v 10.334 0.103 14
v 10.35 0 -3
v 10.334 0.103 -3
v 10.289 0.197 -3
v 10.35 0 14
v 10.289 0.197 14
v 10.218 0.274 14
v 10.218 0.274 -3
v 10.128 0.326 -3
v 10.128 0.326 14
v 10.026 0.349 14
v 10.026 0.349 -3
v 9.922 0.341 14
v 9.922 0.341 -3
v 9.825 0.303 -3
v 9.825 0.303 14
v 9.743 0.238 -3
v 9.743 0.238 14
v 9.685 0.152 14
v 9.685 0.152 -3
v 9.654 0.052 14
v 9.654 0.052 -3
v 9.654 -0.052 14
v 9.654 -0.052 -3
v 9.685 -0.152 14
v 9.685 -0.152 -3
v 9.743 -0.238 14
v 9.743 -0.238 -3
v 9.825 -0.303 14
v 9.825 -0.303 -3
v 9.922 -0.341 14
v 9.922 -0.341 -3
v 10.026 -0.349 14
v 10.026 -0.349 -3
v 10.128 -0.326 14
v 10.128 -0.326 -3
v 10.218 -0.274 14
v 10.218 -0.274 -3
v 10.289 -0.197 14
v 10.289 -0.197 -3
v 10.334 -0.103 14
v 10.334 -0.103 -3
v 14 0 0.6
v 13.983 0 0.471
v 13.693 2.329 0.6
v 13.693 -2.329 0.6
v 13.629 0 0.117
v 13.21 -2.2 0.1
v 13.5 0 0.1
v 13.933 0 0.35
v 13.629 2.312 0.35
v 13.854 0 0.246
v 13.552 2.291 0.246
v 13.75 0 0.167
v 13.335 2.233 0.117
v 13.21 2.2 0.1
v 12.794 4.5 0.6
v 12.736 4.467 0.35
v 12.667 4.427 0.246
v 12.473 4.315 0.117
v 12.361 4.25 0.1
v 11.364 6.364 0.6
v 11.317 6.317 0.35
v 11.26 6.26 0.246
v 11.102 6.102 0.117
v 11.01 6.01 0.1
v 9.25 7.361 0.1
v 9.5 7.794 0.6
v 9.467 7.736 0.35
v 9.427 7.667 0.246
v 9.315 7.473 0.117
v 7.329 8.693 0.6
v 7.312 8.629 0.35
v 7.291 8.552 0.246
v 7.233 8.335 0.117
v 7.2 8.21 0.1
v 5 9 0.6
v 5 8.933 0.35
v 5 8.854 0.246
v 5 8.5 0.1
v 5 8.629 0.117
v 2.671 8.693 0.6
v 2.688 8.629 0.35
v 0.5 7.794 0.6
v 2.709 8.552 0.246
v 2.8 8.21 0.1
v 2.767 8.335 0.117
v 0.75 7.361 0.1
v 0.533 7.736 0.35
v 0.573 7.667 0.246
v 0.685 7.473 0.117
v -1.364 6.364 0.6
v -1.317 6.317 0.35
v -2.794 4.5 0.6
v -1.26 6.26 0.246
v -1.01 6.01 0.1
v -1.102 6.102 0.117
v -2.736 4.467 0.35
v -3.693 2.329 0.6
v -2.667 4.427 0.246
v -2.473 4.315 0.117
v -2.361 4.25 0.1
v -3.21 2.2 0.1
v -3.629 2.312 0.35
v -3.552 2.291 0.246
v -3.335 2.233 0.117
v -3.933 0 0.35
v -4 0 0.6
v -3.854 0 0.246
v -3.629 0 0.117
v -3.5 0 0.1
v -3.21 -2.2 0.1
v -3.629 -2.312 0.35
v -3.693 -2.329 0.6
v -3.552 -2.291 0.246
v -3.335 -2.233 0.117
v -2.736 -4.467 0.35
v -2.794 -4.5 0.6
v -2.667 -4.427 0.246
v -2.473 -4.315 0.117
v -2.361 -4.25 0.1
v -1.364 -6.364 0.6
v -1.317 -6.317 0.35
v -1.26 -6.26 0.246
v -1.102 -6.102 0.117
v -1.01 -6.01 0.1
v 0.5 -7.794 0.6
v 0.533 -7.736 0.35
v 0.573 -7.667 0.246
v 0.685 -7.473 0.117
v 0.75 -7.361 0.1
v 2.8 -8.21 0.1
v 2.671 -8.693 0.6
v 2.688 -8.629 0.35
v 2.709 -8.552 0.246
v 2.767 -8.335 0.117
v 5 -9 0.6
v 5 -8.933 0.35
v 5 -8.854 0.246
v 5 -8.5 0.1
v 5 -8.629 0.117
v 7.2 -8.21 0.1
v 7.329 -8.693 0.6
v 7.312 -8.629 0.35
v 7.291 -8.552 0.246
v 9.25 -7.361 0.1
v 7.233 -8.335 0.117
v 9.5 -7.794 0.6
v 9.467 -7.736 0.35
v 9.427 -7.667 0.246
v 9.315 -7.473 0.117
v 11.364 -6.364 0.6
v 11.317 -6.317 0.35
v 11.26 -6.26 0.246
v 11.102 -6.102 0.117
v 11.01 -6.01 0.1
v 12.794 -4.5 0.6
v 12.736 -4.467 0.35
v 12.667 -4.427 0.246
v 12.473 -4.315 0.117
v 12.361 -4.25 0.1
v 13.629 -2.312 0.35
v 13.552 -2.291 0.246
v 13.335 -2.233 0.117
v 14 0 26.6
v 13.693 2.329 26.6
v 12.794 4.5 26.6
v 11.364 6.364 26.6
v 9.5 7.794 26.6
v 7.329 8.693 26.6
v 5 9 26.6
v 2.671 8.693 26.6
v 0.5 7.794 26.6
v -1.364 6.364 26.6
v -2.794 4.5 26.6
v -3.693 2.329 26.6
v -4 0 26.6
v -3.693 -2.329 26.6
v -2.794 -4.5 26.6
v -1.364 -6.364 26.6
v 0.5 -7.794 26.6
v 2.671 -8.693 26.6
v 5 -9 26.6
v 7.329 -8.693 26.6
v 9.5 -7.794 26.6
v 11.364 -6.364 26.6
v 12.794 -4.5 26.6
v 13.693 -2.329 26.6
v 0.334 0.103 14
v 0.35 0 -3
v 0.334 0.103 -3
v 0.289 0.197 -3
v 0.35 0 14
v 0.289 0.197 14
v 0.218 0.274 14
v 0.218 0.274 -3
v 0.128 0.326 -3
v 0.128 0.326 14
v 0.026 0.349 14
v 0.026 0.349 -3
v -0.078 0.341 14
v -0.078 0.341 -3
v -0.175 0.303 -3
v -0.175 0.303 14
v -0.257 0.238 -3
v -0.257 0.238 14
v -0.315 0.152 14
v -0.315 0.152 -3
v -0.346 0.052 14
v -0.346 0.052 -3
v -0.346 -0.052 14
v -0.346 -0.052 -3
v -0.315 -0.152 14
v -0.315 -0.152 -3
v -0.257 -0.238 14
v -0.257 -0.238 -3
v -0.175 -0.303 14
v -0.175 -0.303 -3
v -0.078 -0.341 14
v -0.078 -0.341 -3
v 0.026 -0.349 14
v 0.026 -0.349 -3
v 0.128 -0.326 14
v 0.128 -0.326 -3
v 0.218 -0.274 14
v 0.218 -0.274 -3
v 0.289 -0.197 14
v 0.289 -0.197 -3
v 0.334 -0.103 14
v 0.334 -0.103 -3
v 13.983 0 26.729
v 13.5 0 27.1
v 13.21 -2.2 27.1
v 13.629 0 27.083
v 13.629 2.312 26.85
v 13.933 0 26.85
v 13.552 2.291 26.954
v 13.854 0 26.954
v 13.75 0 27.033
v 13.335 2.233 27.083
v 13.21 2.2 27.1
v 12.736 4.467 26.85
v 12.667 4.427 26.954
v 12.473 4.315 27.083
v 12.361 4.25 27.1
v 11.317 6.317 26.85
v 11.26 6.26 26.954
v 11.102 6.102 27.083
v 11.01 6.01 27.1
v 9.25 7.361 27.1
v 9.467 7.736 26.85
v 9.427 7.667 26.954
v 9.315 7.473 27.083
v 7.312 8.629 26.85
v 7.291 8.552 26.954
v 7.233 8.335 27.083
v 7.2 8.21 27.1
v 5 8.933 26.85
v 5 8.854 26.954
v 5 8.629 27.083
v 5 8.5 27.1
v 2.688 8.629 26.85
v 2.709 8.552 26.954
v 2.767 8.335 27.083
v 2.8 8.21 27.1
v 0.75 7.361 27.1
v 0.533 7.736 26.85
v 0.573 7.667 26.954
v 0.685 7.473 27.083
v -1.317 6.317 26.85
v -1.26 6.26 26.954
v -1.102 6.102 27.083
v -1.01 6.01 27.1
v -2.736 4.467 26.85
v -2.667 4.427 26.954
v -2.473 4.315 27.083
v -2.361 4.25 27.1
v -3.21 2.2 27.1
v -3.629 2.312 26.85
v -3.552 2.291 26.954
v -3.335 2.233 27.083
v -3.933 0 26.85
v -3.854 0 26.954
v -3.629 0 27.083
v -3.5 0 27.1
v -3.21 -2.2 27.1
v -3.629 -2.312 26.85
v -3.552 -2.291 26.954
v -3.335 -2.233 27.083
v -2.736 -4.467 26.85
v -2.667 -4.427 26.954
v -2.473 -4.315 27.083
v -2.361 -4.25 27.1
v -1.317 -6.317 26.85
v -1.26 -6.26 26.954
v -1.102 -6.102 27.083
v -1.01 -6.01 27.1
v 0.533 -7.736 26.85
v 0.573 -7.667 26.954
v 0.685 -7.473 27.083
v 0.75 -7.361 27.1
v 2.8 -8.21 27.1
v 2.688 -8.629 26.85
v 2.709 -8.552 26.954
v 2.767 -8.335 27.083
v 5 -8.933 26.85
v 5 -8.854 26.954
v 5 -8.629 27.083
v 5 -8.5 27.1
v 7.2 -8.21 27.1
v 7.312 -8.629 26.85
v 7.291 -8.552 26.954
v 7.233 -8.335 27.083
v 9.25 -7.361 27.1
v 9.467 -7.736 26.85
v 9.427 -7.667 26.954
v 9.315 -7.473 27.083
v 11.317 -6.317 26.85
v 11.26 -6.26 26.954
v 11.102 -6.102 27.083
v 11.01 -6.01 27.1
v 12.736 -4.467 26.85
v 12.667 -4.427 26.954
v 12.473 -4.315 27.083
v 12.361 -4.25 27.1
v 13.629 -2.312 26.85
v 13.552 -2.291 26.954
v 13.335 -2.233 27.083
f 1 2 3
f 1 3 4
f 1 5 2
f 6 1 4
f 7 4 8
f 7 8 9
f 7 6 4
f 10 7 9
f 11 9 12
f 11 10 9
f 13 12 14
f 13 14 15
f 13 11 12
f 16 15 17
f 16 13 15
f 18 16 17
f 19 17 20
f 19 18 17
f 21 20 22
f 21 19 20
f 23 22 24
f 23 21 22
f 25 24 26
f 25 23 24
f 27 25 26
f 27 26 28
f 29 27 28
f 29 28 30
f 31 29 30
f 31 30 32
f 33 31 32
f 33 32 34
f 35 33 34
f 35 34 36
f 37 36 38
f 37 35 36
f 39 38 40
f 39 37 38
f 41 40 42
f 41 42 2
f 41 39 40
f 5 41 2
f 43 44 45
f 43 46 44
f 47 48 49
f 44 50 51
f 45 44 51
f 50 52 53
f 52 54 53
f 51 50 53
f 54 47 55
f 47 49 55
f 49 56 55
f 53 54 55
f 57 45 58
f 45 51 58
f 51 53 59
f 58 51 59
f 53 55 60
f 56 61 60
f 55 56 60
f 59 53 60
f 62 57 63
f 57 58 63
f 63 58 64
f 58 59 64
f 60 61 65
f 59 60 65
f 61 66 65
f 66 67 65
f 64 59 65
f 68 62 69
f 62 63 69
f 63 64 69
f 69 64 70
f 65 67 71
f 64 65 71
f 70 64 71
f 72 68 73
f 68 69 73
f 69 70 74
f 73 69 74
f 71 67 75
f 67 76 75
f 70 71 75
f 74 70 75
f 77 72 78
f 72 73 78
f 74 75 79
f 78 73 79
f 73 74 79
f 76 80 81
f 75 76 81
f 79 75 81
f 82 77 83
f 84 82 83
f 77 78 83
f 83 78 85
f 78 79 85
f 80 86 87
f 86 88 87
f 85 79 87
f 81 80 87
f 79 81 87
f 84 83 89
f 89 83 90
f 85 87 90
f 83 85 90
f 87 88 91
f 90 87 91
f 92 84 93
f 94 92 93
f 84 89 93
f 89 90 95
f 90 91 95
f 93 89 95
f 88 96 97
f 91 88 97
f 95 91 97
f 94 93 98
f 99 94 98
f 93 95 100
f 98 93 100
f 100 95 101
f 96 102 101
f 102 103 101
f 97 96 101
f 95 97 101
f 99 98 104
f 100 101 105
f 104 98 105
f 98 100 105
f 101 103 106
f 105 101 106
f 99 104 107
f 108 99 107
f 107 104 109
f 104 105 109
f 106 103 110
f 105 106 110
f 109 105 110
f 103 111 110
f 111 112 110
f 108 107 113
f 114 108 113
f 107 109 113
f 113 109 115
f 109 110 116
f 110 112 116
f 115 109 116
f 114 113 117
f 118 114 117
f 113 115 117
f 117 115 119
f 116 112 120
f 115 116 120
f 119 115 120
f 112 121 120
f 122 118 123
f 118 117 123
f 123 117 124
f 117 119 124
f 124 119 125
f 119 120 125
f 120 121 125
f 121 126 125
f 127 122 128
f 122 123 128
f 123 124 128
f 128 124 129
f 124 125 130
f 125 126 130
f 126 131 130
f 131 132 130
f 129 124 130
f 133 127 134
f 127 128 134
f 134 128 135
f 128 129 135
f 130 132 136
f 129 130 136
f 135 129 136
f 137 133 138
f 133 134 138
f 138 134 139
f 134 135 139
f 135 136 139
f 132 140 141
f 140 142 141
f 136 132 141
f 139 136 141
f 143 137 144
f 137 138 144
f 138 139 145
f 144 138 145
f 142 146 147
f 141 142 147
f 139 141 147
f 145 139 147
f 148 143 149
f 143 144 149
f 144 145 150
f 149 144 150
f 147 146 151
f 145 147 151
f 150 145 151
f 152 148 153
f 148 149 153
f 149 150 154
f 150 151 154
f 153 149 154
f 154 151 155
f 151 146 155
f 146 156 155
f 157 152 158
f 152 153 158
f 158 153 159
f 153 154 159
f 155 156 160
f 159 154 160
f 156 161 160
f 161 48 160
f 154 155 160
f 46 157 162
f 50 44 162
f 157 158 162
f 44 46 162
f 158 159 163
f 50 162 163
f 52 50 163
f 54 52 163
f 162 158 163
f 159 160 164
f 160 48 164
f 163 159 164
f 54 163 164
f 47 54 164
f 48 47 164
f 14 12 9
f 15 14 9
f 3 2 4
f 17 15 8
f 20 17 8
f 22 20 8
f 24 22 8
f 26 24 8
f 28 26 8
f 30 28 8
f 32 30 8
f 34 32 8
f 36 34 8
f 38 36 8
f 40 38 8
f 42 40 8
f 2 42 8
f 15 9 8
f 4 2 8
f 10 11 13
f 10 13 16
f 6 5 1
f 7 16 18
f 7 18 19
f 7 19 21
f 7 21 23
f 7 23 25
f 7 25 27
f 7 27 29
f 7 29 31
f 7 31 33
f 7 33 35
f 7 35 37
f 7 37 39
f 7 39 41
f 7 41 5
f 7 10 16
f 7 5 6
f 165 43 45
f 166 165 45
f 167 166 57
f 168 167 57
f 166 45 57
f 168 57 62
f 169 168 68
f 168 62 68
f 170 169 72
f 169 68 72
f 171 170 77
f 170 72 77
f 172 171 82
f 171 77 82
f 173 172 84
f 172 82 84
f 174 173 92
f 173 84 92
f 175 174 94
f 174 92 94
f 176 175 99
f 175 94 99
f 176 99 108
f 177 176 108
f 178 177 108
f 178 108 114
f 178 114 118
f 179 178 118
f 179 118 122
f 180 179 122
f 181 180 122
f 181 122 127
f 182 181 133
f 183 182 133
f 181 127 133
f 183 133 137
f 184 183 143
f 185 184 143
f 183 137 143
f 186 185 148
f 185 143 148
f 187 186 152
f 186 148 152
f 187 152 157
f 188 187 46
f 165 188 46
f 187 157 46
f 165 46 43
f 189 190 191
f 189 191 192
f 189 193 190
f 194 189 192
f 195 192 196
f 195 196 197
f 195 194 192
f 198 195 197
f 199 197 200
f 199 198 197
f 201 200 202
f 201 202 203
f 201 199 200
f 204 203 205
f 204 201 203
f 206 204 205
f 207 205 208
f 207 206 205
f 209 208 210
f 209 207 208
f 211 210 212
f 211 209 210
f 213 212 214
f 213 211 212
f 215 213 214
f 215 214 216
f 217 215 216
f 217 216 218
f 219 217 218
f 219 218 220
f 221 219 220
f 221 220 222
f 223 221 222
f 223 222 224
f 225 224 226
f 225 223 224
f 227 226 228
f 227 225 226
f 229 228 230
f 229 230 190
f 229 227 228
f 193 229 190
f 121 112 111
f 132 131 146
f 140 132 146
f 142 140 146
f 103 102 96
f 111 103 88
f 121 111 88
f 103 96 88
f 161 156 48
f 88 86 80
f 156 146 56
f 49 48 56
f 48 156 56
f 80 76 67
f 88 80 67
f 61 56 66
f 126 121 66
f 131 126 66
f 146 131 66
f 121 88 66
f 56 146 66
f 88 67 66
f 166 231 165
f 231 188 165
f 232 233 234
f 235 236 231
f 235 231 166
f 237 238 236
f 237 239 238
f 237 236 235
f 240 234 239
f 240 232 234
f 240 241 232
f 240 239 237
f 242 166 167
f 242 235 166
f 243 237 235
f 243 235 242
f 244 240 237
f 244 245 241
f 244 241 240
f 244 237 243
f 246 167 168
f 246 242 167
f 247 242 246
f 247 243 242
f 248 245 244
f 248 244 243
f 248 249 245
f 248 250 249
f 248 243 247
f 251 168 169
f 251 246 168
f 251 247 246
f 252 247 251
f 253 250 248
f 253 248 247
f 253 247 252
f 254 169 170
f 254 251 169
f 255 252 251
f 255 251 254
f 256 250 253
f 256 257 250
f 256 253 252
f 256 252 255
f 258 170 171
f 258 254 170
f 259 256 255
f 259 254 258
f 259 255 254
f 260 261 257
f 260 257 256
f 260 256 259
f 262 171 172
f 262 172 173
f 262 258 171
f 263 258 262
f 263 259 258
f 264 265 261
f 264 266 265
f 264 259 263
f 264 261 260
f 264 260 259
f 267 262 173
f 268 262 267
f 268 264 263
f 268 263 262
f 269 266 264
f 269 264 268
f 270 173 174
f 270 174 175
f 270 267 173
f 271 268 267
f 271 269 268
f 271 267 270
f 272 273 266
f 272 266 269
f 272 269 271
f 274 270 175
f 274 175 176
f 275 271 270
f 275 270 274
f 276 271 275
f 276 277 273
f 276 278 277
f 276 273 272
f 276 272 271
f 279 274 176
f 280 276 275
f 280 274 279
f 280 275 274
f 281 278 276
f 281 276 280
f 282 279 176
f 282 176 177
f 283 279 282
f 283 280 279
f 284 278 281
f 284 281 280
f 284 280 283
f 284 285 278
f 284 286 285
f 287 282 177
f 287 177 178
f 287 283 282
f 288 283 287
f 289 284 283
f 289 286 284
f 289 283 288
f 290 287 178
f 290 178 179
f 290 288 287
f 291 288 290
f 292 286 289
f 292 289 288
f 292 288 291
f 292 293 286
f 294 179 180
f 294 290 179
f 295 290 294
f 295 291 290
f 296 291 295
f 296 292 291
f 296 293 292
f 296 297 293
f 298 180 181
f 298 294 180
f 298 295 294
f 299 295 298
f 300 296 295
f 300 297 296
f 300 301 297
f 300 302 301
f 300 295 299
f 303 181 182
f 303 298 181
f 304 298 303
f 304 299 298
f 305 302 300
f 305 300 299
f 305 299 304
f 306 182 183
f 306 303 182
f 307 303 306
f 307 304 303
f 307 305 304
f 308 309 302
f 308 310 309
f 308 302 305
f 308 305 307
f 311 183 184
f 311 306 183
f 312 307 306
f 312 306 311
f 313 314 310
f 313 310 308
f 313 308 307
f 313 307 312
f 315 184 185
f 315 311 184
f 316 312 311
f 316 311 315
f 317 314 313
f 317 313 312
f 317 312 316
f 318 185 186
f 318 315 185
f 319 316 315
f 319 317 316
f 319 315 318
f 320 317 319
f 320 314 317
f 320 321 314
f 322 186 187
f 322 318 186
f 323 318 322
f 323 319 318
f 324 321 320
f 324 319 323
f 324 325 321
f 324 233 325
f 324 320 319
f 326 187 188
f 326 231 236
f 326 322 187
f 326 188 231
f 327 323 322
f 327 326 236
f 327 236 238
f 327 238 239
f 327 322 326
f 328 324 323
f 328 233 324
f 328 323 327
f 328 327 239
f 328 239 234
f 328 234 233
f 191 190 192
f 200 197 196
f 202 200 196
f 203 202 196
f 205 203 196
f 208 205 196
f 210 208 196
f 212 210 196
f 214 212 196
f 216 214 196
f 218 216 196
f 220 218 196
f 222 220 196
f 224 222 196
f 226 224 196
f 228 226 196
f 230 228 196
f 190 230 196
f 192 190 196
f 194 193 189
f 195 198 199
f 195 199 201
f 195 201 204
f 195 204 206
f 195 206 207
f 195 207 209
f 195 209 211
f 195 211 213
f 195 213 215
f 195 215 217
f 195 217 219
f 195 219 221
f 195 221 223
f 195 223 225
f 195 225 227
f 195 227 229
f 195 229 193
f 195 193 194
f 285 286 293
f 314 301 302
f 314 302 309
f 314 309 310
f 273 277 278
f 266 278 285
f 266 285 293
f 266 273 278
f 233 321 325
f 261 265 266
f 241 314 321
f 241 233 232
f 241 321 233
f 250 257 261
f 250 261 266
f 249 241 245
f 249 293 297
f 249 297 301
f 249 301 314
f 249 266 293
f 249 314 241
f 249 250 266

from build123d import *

# Parameters (mm, degrees)
SKETCH001_R       = 0.35
PAD001_DEPTH      = 13.5
PAD001_DEPTH_BACK = 3.5
SKETCH_R          = 9
PAD_DEPTH         = 27
FILLET_R          = 0.5


with BuildPart() as pad001:
    # Sketch001 → Pad001 (new body, two sides)
    with BuildSketch(Plane.XY.offset(0.5)) as pad001_sk:
        Circle(SKETCH001_R)
        with Locations((10, 0)):
            Circle(SKETCH001_R)
    extrude(amount=PAD001_DEPTH)
    extrude(pad001_sk.sketch, amount=-PAD001_DEPTH_BACK)


with BuildPart() as fillet_body:
    # Sketch → Pad (new body)
    with BuildSketch(Plane.XY.offset(0.1)):
        with Locations((5, 0)):
            Circle(SKETCH_R)
    extrude(amount=PAD_DEPTH)

    # Fillet
    fillet_edges = [fillet_body.edges().sort_by_distance(p)[0] for p in [
        (-4, 0, 0.1),
        (-4, 0, 27.1),
    ]]
    fillet(fillet_edges, radius=FILLET_R)


solid = Compound([pad001.part, fillet_body.part])
